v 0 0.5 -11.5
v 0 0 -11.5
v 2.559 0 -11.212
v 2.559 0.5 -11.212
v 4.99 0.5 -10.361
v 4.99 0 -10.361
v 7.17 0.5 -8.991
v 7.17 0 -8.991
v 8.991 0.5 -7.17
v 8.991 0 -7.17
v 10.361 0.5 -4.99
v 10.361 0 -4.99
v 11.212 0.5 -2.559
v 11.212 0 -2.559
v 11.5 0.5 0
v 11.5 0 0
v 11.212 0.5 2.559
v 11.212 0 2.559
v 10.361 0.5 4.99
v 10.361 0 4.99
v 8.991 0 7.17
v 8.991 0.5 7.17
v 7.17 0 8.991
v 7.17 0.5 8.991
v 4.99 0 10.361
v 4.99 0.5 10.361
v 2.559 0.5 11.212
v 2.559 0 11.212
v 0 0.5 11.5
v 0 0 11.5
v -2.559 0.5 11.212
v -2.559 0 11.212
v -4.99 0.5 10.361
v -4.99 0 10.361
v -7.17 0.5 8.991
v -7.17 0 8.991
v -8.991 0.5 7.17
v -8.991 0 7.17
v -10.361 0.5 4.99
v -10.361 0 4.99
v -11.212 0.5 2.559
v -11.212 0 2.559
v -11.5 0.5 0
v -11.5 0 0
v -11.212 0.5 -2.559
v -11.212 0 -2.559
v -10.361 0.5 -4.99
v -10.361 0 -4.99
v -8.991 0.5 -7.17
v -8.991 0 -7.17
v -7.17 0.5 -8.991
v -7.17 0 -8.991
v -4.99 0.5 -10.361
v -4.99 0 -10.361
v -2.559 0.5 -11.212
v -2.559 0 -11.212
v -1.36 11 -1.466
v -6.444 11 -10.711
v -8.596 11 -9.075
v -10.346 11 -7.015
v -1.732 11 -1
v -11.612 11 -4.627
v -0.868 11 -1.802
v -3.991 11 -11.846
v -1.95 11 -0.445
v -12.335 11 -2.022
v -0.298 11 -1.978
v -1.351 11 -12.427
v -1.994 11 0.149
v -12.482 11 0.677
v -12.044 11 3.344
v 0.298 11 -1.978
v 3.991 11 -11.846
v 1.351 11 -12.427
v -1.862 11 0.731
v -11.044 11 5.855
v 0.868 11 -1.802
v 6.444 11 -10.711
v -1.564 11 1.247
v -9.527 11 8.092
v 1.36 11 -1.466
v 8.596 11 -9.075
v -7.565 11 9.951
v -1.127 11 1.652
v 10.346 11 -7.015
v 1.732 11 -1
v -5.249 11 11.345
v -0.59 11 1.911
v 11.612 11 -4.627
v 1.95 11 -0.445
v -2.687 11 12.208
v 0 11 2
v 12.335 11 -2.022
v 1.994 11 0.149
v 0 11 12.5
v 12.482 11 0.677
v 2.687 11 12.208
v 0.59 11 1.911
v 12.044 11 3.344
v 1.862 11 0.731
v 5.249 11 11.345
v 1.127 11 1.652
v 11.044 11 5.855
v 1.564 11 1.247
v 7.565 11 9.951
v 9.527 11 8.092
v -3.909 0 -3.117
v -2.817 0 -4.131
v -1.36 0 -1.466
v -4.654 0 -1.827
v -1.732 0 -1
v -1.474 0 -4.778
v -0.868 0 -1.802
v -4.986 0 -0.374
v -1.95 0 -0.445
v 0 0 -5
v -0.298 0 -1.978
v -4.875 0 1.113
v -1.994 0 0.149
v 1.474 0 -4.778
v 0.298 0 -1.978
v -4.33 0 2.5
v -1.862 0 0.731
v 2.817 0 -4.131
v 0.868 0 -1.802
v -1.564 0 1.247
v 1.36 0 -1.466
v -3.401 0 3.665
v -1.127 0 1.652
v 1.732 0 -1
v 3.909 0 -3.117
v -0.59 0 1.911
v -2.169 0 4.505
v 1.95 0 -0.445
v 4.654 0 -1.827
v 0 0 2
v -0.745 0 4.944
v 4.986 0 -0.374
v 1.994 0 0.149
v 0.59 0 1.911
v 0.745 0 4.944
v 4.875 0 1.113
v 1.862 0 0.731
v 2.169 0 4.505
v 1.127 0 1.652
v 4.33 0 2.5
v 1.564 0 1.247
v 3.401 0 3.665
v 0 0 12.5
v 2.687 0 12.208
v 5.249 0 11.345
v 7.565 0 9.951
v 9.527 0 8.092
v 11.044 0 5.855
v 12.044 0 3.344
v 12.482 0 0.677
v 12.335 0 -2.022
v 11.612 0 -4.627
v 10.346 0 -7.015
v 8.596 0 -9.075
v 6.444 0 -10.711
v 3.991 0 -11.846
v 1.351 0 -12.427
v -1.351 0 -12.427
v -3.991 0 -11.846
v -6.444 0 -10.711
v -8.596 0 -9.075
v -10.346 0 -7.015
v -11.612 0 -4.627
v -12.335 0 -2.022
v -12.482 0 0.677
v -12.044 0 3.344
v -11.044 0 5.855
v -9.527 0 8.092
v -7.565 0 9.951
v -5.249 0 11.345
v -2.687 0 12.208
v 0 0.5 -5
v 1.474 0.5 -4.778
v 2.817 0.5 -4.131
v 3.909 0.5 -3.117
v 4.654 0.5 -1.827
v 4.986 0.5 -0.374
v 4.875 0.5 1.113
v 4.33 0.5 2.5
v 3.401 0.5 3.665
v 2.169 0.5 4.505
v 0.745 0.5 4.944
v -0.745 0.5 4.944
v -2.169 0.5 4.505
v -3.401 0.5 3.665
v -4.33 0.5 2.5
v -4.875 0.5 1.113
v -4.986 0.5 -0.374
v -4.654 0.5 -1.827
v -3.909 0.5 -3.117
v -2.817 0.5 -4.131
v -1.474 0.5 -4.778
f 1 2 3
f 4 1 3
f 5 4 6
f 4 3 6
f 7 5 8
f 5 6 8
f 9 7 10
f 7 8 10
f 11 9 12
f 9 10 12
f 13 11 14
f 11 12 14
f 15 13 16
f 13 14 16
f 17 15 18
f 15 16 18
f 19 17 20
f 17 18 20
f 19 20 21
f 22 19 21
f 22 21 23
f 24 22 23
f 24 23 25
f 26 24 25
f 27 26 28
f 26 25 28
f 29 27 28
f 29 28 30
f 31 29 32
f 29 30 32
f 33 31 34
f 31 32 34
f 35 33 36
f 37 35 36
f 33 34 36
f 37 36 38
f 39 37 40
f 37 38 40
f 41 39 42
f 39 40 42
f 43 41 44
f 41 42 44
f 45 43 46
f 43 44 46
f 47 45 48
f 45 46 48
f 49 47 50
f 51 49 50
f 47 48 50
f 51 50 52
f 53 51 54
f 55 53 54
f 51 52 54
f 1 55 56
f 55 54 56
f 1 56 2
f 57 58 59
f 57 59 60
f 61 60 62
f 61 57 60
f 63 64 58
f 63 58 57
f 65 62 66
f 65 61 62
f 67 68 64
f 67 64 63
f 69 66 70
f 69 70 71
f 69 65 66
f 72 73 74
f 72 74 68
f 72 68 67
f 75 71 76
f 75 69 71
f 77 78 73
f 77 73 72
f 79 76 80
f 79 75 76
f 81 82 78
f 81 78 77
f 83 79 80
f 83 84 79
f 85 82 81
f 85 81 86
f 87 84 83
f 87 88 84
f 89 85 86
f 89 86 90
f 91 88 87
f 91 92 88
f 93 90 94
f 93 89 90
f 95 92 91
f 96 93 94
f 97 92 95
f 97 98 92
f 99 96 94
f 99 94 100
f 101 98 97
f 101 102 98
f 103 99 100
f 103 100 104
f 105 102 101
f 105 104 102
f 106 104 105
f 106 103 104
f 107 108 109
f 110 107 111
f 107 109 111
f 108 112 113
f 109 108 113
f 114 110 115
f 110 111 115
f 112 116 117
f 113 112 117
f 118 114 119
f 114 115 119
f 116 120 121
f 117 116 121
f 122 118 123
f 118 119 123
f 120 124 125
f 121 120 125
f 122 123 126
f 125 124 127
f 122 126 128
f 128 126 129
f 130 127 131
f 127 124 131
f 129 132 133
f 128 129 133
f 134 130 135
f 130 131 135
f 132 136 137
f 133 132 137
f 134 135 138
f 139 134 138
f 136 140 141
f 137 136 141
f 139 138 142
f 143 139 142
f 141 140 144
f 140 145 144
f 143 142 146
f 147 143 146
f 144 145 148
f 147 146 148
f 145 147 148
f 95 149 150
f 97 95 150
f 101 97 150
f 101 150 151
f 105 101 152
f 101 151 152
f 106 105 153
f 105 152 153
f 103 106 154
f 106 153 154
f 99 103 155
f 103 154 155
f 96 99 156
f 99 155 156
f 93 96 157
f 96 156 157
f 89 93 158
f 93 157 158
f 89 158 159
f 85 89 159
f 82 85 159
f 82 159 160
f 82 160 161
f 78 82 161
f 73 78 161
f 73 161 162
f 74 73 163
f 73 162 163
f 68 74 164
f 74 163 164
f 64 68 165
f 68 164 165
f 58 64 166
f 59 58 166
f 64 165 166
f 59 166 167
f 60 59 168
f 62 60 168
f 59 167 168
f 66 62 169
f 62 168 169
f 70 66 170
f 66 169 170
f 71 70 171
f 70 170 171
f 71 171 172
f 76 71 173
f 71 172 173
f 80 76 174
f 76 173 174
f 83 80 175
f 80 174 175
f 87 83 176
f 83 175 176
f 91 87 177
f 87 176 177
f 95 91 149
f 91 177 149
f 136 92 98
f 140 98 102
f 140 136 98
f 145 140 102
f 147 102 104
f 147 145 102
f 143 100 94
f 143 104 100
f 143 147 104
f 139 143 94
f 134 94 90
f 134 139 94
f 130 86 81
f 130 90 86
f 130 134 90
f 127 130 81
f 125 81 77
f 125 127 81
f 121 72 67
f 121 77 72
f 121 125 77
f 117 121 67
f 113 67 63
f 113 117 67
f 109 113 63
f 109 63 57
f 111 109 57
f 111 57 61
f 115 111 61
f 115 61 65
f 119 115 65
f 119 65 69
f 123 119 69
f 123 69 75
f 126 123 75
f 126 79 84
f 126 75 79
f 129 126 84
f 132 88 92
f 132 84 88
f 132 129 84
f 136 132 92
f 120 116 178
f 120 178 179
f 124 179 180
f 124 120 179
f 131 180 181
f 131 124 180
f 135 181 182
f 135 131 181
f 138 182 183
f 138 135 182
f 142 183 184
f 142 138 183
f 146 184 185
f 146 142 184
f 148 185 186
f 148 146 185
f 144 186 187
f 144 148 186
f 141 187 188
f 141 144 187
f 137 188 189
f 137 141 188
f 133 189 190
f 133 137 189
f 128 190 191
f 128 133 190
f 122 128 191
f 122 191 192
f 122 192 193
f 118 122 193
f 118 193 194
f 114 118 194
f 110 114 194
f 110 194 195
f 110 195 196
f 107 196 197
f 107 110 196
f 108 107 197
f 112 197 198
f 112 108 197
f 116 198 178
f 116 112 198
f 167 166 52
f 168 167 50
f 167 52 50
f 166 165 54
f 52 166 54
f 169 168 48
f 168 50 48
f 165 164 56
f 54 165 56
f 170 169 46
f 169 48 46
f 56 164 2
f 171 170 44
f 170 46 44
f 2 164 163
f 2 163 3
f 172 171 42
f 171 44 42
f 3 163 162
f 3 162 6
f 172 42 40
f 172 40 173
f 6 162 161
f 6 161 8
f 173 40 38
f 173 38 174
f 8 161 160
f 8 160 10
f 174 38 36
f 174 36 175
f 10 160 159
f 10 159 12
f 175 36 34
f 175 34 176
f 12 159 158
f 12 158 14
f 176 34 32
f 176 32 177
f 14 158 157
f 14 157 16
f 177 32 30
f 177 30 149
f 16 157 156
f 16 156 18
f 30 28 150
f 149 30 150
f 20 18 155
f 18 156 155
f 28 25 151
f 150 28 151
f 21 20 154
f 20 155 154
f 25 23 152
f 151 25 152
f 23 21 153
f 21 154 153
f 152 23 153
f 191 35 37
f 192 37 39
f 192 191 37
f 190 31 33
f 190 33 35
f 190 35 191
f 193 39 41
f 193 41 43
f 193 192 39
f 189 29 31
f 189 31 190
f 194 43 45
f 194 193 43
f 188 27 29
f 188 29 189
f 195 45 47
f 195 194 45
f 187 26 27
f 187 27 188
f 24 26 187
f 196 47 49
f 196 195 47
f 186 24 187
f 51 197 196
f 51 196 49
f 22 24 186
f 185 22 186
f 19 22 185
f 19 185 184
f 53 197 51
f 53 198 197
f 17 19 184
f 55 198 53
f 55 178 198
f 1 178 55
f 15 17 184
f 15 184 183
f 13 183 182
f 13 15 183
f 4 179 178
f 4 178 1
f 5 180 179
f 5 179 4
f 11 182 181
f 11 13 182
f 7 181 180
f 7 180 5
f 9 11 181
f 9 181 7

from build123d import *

# Parameters (mm, degrees)
SKETCH1_R               = 12.5
BOSS_EXTRUDE1_DEPTH     = 11
CUT_EXTRUDE1_DEPTH      = 21.820662814
CUT_EXTRUDE1_DEPTH_BACK = 21.820662814
SKETCH2_R               = 2
SKETCH3_R               = 11.5
SKETCH3_R_2             = 5
CUT_EXTRUDE2_DEPTH      = 0.5


with BuildPart() as part:
    # Sketch1 → Boss-Extrude1 (new body)
    with BuildSketch(Plane(origin=(0, 0, 0), x_dir=(1, 0, 0), z_dir=(0, 1, 0))):
        with Locations(Location((0, 0, 0), (0, 0, 270))):
            Circle(SKETCH1_R)
    extrude(amount=BOSS_EXTRUDE1_DEPTH)

    # Sketch2 → Cut-Extrude1 (cut, two sides: drawn at the far end of the back side and taken through both)
    with BuildSketch(Plane(origin=(0, 11, 0), x_dir=(1, 0, 0), z_dir=(0, 1, 0)).offset(-CUT_EXTRUDE1_DEPTH_BACK)):
        with Locations(Location((0, 0, 0), (0, 0, 270))):
            Circle(SKETCH2_R)
    extrude(amount=CUT_EXTRUDE1_DEPTH + CUT_EXTRUDE1_DEPTH_BACK, mode=Mode.SUBTRACT)

    # Sketch3 → Cut-Extrude2 (cut)
    with BuildSketch(Plane.XZ):
        with Locations(Location((0, 0, 0), (0, 0, 270))):
            Circle(SKETCH3_R)
        with Locations(Location((0, 0, 0), (0, 0, 270))):
            Circle(SKETCH3_R_2, mode=Mode.SUBTRACT)
    extrude(amount=-CUT_EXTRUDE2_DEPTH, mode=Mode.SUBTRACT)


solid = part.part
